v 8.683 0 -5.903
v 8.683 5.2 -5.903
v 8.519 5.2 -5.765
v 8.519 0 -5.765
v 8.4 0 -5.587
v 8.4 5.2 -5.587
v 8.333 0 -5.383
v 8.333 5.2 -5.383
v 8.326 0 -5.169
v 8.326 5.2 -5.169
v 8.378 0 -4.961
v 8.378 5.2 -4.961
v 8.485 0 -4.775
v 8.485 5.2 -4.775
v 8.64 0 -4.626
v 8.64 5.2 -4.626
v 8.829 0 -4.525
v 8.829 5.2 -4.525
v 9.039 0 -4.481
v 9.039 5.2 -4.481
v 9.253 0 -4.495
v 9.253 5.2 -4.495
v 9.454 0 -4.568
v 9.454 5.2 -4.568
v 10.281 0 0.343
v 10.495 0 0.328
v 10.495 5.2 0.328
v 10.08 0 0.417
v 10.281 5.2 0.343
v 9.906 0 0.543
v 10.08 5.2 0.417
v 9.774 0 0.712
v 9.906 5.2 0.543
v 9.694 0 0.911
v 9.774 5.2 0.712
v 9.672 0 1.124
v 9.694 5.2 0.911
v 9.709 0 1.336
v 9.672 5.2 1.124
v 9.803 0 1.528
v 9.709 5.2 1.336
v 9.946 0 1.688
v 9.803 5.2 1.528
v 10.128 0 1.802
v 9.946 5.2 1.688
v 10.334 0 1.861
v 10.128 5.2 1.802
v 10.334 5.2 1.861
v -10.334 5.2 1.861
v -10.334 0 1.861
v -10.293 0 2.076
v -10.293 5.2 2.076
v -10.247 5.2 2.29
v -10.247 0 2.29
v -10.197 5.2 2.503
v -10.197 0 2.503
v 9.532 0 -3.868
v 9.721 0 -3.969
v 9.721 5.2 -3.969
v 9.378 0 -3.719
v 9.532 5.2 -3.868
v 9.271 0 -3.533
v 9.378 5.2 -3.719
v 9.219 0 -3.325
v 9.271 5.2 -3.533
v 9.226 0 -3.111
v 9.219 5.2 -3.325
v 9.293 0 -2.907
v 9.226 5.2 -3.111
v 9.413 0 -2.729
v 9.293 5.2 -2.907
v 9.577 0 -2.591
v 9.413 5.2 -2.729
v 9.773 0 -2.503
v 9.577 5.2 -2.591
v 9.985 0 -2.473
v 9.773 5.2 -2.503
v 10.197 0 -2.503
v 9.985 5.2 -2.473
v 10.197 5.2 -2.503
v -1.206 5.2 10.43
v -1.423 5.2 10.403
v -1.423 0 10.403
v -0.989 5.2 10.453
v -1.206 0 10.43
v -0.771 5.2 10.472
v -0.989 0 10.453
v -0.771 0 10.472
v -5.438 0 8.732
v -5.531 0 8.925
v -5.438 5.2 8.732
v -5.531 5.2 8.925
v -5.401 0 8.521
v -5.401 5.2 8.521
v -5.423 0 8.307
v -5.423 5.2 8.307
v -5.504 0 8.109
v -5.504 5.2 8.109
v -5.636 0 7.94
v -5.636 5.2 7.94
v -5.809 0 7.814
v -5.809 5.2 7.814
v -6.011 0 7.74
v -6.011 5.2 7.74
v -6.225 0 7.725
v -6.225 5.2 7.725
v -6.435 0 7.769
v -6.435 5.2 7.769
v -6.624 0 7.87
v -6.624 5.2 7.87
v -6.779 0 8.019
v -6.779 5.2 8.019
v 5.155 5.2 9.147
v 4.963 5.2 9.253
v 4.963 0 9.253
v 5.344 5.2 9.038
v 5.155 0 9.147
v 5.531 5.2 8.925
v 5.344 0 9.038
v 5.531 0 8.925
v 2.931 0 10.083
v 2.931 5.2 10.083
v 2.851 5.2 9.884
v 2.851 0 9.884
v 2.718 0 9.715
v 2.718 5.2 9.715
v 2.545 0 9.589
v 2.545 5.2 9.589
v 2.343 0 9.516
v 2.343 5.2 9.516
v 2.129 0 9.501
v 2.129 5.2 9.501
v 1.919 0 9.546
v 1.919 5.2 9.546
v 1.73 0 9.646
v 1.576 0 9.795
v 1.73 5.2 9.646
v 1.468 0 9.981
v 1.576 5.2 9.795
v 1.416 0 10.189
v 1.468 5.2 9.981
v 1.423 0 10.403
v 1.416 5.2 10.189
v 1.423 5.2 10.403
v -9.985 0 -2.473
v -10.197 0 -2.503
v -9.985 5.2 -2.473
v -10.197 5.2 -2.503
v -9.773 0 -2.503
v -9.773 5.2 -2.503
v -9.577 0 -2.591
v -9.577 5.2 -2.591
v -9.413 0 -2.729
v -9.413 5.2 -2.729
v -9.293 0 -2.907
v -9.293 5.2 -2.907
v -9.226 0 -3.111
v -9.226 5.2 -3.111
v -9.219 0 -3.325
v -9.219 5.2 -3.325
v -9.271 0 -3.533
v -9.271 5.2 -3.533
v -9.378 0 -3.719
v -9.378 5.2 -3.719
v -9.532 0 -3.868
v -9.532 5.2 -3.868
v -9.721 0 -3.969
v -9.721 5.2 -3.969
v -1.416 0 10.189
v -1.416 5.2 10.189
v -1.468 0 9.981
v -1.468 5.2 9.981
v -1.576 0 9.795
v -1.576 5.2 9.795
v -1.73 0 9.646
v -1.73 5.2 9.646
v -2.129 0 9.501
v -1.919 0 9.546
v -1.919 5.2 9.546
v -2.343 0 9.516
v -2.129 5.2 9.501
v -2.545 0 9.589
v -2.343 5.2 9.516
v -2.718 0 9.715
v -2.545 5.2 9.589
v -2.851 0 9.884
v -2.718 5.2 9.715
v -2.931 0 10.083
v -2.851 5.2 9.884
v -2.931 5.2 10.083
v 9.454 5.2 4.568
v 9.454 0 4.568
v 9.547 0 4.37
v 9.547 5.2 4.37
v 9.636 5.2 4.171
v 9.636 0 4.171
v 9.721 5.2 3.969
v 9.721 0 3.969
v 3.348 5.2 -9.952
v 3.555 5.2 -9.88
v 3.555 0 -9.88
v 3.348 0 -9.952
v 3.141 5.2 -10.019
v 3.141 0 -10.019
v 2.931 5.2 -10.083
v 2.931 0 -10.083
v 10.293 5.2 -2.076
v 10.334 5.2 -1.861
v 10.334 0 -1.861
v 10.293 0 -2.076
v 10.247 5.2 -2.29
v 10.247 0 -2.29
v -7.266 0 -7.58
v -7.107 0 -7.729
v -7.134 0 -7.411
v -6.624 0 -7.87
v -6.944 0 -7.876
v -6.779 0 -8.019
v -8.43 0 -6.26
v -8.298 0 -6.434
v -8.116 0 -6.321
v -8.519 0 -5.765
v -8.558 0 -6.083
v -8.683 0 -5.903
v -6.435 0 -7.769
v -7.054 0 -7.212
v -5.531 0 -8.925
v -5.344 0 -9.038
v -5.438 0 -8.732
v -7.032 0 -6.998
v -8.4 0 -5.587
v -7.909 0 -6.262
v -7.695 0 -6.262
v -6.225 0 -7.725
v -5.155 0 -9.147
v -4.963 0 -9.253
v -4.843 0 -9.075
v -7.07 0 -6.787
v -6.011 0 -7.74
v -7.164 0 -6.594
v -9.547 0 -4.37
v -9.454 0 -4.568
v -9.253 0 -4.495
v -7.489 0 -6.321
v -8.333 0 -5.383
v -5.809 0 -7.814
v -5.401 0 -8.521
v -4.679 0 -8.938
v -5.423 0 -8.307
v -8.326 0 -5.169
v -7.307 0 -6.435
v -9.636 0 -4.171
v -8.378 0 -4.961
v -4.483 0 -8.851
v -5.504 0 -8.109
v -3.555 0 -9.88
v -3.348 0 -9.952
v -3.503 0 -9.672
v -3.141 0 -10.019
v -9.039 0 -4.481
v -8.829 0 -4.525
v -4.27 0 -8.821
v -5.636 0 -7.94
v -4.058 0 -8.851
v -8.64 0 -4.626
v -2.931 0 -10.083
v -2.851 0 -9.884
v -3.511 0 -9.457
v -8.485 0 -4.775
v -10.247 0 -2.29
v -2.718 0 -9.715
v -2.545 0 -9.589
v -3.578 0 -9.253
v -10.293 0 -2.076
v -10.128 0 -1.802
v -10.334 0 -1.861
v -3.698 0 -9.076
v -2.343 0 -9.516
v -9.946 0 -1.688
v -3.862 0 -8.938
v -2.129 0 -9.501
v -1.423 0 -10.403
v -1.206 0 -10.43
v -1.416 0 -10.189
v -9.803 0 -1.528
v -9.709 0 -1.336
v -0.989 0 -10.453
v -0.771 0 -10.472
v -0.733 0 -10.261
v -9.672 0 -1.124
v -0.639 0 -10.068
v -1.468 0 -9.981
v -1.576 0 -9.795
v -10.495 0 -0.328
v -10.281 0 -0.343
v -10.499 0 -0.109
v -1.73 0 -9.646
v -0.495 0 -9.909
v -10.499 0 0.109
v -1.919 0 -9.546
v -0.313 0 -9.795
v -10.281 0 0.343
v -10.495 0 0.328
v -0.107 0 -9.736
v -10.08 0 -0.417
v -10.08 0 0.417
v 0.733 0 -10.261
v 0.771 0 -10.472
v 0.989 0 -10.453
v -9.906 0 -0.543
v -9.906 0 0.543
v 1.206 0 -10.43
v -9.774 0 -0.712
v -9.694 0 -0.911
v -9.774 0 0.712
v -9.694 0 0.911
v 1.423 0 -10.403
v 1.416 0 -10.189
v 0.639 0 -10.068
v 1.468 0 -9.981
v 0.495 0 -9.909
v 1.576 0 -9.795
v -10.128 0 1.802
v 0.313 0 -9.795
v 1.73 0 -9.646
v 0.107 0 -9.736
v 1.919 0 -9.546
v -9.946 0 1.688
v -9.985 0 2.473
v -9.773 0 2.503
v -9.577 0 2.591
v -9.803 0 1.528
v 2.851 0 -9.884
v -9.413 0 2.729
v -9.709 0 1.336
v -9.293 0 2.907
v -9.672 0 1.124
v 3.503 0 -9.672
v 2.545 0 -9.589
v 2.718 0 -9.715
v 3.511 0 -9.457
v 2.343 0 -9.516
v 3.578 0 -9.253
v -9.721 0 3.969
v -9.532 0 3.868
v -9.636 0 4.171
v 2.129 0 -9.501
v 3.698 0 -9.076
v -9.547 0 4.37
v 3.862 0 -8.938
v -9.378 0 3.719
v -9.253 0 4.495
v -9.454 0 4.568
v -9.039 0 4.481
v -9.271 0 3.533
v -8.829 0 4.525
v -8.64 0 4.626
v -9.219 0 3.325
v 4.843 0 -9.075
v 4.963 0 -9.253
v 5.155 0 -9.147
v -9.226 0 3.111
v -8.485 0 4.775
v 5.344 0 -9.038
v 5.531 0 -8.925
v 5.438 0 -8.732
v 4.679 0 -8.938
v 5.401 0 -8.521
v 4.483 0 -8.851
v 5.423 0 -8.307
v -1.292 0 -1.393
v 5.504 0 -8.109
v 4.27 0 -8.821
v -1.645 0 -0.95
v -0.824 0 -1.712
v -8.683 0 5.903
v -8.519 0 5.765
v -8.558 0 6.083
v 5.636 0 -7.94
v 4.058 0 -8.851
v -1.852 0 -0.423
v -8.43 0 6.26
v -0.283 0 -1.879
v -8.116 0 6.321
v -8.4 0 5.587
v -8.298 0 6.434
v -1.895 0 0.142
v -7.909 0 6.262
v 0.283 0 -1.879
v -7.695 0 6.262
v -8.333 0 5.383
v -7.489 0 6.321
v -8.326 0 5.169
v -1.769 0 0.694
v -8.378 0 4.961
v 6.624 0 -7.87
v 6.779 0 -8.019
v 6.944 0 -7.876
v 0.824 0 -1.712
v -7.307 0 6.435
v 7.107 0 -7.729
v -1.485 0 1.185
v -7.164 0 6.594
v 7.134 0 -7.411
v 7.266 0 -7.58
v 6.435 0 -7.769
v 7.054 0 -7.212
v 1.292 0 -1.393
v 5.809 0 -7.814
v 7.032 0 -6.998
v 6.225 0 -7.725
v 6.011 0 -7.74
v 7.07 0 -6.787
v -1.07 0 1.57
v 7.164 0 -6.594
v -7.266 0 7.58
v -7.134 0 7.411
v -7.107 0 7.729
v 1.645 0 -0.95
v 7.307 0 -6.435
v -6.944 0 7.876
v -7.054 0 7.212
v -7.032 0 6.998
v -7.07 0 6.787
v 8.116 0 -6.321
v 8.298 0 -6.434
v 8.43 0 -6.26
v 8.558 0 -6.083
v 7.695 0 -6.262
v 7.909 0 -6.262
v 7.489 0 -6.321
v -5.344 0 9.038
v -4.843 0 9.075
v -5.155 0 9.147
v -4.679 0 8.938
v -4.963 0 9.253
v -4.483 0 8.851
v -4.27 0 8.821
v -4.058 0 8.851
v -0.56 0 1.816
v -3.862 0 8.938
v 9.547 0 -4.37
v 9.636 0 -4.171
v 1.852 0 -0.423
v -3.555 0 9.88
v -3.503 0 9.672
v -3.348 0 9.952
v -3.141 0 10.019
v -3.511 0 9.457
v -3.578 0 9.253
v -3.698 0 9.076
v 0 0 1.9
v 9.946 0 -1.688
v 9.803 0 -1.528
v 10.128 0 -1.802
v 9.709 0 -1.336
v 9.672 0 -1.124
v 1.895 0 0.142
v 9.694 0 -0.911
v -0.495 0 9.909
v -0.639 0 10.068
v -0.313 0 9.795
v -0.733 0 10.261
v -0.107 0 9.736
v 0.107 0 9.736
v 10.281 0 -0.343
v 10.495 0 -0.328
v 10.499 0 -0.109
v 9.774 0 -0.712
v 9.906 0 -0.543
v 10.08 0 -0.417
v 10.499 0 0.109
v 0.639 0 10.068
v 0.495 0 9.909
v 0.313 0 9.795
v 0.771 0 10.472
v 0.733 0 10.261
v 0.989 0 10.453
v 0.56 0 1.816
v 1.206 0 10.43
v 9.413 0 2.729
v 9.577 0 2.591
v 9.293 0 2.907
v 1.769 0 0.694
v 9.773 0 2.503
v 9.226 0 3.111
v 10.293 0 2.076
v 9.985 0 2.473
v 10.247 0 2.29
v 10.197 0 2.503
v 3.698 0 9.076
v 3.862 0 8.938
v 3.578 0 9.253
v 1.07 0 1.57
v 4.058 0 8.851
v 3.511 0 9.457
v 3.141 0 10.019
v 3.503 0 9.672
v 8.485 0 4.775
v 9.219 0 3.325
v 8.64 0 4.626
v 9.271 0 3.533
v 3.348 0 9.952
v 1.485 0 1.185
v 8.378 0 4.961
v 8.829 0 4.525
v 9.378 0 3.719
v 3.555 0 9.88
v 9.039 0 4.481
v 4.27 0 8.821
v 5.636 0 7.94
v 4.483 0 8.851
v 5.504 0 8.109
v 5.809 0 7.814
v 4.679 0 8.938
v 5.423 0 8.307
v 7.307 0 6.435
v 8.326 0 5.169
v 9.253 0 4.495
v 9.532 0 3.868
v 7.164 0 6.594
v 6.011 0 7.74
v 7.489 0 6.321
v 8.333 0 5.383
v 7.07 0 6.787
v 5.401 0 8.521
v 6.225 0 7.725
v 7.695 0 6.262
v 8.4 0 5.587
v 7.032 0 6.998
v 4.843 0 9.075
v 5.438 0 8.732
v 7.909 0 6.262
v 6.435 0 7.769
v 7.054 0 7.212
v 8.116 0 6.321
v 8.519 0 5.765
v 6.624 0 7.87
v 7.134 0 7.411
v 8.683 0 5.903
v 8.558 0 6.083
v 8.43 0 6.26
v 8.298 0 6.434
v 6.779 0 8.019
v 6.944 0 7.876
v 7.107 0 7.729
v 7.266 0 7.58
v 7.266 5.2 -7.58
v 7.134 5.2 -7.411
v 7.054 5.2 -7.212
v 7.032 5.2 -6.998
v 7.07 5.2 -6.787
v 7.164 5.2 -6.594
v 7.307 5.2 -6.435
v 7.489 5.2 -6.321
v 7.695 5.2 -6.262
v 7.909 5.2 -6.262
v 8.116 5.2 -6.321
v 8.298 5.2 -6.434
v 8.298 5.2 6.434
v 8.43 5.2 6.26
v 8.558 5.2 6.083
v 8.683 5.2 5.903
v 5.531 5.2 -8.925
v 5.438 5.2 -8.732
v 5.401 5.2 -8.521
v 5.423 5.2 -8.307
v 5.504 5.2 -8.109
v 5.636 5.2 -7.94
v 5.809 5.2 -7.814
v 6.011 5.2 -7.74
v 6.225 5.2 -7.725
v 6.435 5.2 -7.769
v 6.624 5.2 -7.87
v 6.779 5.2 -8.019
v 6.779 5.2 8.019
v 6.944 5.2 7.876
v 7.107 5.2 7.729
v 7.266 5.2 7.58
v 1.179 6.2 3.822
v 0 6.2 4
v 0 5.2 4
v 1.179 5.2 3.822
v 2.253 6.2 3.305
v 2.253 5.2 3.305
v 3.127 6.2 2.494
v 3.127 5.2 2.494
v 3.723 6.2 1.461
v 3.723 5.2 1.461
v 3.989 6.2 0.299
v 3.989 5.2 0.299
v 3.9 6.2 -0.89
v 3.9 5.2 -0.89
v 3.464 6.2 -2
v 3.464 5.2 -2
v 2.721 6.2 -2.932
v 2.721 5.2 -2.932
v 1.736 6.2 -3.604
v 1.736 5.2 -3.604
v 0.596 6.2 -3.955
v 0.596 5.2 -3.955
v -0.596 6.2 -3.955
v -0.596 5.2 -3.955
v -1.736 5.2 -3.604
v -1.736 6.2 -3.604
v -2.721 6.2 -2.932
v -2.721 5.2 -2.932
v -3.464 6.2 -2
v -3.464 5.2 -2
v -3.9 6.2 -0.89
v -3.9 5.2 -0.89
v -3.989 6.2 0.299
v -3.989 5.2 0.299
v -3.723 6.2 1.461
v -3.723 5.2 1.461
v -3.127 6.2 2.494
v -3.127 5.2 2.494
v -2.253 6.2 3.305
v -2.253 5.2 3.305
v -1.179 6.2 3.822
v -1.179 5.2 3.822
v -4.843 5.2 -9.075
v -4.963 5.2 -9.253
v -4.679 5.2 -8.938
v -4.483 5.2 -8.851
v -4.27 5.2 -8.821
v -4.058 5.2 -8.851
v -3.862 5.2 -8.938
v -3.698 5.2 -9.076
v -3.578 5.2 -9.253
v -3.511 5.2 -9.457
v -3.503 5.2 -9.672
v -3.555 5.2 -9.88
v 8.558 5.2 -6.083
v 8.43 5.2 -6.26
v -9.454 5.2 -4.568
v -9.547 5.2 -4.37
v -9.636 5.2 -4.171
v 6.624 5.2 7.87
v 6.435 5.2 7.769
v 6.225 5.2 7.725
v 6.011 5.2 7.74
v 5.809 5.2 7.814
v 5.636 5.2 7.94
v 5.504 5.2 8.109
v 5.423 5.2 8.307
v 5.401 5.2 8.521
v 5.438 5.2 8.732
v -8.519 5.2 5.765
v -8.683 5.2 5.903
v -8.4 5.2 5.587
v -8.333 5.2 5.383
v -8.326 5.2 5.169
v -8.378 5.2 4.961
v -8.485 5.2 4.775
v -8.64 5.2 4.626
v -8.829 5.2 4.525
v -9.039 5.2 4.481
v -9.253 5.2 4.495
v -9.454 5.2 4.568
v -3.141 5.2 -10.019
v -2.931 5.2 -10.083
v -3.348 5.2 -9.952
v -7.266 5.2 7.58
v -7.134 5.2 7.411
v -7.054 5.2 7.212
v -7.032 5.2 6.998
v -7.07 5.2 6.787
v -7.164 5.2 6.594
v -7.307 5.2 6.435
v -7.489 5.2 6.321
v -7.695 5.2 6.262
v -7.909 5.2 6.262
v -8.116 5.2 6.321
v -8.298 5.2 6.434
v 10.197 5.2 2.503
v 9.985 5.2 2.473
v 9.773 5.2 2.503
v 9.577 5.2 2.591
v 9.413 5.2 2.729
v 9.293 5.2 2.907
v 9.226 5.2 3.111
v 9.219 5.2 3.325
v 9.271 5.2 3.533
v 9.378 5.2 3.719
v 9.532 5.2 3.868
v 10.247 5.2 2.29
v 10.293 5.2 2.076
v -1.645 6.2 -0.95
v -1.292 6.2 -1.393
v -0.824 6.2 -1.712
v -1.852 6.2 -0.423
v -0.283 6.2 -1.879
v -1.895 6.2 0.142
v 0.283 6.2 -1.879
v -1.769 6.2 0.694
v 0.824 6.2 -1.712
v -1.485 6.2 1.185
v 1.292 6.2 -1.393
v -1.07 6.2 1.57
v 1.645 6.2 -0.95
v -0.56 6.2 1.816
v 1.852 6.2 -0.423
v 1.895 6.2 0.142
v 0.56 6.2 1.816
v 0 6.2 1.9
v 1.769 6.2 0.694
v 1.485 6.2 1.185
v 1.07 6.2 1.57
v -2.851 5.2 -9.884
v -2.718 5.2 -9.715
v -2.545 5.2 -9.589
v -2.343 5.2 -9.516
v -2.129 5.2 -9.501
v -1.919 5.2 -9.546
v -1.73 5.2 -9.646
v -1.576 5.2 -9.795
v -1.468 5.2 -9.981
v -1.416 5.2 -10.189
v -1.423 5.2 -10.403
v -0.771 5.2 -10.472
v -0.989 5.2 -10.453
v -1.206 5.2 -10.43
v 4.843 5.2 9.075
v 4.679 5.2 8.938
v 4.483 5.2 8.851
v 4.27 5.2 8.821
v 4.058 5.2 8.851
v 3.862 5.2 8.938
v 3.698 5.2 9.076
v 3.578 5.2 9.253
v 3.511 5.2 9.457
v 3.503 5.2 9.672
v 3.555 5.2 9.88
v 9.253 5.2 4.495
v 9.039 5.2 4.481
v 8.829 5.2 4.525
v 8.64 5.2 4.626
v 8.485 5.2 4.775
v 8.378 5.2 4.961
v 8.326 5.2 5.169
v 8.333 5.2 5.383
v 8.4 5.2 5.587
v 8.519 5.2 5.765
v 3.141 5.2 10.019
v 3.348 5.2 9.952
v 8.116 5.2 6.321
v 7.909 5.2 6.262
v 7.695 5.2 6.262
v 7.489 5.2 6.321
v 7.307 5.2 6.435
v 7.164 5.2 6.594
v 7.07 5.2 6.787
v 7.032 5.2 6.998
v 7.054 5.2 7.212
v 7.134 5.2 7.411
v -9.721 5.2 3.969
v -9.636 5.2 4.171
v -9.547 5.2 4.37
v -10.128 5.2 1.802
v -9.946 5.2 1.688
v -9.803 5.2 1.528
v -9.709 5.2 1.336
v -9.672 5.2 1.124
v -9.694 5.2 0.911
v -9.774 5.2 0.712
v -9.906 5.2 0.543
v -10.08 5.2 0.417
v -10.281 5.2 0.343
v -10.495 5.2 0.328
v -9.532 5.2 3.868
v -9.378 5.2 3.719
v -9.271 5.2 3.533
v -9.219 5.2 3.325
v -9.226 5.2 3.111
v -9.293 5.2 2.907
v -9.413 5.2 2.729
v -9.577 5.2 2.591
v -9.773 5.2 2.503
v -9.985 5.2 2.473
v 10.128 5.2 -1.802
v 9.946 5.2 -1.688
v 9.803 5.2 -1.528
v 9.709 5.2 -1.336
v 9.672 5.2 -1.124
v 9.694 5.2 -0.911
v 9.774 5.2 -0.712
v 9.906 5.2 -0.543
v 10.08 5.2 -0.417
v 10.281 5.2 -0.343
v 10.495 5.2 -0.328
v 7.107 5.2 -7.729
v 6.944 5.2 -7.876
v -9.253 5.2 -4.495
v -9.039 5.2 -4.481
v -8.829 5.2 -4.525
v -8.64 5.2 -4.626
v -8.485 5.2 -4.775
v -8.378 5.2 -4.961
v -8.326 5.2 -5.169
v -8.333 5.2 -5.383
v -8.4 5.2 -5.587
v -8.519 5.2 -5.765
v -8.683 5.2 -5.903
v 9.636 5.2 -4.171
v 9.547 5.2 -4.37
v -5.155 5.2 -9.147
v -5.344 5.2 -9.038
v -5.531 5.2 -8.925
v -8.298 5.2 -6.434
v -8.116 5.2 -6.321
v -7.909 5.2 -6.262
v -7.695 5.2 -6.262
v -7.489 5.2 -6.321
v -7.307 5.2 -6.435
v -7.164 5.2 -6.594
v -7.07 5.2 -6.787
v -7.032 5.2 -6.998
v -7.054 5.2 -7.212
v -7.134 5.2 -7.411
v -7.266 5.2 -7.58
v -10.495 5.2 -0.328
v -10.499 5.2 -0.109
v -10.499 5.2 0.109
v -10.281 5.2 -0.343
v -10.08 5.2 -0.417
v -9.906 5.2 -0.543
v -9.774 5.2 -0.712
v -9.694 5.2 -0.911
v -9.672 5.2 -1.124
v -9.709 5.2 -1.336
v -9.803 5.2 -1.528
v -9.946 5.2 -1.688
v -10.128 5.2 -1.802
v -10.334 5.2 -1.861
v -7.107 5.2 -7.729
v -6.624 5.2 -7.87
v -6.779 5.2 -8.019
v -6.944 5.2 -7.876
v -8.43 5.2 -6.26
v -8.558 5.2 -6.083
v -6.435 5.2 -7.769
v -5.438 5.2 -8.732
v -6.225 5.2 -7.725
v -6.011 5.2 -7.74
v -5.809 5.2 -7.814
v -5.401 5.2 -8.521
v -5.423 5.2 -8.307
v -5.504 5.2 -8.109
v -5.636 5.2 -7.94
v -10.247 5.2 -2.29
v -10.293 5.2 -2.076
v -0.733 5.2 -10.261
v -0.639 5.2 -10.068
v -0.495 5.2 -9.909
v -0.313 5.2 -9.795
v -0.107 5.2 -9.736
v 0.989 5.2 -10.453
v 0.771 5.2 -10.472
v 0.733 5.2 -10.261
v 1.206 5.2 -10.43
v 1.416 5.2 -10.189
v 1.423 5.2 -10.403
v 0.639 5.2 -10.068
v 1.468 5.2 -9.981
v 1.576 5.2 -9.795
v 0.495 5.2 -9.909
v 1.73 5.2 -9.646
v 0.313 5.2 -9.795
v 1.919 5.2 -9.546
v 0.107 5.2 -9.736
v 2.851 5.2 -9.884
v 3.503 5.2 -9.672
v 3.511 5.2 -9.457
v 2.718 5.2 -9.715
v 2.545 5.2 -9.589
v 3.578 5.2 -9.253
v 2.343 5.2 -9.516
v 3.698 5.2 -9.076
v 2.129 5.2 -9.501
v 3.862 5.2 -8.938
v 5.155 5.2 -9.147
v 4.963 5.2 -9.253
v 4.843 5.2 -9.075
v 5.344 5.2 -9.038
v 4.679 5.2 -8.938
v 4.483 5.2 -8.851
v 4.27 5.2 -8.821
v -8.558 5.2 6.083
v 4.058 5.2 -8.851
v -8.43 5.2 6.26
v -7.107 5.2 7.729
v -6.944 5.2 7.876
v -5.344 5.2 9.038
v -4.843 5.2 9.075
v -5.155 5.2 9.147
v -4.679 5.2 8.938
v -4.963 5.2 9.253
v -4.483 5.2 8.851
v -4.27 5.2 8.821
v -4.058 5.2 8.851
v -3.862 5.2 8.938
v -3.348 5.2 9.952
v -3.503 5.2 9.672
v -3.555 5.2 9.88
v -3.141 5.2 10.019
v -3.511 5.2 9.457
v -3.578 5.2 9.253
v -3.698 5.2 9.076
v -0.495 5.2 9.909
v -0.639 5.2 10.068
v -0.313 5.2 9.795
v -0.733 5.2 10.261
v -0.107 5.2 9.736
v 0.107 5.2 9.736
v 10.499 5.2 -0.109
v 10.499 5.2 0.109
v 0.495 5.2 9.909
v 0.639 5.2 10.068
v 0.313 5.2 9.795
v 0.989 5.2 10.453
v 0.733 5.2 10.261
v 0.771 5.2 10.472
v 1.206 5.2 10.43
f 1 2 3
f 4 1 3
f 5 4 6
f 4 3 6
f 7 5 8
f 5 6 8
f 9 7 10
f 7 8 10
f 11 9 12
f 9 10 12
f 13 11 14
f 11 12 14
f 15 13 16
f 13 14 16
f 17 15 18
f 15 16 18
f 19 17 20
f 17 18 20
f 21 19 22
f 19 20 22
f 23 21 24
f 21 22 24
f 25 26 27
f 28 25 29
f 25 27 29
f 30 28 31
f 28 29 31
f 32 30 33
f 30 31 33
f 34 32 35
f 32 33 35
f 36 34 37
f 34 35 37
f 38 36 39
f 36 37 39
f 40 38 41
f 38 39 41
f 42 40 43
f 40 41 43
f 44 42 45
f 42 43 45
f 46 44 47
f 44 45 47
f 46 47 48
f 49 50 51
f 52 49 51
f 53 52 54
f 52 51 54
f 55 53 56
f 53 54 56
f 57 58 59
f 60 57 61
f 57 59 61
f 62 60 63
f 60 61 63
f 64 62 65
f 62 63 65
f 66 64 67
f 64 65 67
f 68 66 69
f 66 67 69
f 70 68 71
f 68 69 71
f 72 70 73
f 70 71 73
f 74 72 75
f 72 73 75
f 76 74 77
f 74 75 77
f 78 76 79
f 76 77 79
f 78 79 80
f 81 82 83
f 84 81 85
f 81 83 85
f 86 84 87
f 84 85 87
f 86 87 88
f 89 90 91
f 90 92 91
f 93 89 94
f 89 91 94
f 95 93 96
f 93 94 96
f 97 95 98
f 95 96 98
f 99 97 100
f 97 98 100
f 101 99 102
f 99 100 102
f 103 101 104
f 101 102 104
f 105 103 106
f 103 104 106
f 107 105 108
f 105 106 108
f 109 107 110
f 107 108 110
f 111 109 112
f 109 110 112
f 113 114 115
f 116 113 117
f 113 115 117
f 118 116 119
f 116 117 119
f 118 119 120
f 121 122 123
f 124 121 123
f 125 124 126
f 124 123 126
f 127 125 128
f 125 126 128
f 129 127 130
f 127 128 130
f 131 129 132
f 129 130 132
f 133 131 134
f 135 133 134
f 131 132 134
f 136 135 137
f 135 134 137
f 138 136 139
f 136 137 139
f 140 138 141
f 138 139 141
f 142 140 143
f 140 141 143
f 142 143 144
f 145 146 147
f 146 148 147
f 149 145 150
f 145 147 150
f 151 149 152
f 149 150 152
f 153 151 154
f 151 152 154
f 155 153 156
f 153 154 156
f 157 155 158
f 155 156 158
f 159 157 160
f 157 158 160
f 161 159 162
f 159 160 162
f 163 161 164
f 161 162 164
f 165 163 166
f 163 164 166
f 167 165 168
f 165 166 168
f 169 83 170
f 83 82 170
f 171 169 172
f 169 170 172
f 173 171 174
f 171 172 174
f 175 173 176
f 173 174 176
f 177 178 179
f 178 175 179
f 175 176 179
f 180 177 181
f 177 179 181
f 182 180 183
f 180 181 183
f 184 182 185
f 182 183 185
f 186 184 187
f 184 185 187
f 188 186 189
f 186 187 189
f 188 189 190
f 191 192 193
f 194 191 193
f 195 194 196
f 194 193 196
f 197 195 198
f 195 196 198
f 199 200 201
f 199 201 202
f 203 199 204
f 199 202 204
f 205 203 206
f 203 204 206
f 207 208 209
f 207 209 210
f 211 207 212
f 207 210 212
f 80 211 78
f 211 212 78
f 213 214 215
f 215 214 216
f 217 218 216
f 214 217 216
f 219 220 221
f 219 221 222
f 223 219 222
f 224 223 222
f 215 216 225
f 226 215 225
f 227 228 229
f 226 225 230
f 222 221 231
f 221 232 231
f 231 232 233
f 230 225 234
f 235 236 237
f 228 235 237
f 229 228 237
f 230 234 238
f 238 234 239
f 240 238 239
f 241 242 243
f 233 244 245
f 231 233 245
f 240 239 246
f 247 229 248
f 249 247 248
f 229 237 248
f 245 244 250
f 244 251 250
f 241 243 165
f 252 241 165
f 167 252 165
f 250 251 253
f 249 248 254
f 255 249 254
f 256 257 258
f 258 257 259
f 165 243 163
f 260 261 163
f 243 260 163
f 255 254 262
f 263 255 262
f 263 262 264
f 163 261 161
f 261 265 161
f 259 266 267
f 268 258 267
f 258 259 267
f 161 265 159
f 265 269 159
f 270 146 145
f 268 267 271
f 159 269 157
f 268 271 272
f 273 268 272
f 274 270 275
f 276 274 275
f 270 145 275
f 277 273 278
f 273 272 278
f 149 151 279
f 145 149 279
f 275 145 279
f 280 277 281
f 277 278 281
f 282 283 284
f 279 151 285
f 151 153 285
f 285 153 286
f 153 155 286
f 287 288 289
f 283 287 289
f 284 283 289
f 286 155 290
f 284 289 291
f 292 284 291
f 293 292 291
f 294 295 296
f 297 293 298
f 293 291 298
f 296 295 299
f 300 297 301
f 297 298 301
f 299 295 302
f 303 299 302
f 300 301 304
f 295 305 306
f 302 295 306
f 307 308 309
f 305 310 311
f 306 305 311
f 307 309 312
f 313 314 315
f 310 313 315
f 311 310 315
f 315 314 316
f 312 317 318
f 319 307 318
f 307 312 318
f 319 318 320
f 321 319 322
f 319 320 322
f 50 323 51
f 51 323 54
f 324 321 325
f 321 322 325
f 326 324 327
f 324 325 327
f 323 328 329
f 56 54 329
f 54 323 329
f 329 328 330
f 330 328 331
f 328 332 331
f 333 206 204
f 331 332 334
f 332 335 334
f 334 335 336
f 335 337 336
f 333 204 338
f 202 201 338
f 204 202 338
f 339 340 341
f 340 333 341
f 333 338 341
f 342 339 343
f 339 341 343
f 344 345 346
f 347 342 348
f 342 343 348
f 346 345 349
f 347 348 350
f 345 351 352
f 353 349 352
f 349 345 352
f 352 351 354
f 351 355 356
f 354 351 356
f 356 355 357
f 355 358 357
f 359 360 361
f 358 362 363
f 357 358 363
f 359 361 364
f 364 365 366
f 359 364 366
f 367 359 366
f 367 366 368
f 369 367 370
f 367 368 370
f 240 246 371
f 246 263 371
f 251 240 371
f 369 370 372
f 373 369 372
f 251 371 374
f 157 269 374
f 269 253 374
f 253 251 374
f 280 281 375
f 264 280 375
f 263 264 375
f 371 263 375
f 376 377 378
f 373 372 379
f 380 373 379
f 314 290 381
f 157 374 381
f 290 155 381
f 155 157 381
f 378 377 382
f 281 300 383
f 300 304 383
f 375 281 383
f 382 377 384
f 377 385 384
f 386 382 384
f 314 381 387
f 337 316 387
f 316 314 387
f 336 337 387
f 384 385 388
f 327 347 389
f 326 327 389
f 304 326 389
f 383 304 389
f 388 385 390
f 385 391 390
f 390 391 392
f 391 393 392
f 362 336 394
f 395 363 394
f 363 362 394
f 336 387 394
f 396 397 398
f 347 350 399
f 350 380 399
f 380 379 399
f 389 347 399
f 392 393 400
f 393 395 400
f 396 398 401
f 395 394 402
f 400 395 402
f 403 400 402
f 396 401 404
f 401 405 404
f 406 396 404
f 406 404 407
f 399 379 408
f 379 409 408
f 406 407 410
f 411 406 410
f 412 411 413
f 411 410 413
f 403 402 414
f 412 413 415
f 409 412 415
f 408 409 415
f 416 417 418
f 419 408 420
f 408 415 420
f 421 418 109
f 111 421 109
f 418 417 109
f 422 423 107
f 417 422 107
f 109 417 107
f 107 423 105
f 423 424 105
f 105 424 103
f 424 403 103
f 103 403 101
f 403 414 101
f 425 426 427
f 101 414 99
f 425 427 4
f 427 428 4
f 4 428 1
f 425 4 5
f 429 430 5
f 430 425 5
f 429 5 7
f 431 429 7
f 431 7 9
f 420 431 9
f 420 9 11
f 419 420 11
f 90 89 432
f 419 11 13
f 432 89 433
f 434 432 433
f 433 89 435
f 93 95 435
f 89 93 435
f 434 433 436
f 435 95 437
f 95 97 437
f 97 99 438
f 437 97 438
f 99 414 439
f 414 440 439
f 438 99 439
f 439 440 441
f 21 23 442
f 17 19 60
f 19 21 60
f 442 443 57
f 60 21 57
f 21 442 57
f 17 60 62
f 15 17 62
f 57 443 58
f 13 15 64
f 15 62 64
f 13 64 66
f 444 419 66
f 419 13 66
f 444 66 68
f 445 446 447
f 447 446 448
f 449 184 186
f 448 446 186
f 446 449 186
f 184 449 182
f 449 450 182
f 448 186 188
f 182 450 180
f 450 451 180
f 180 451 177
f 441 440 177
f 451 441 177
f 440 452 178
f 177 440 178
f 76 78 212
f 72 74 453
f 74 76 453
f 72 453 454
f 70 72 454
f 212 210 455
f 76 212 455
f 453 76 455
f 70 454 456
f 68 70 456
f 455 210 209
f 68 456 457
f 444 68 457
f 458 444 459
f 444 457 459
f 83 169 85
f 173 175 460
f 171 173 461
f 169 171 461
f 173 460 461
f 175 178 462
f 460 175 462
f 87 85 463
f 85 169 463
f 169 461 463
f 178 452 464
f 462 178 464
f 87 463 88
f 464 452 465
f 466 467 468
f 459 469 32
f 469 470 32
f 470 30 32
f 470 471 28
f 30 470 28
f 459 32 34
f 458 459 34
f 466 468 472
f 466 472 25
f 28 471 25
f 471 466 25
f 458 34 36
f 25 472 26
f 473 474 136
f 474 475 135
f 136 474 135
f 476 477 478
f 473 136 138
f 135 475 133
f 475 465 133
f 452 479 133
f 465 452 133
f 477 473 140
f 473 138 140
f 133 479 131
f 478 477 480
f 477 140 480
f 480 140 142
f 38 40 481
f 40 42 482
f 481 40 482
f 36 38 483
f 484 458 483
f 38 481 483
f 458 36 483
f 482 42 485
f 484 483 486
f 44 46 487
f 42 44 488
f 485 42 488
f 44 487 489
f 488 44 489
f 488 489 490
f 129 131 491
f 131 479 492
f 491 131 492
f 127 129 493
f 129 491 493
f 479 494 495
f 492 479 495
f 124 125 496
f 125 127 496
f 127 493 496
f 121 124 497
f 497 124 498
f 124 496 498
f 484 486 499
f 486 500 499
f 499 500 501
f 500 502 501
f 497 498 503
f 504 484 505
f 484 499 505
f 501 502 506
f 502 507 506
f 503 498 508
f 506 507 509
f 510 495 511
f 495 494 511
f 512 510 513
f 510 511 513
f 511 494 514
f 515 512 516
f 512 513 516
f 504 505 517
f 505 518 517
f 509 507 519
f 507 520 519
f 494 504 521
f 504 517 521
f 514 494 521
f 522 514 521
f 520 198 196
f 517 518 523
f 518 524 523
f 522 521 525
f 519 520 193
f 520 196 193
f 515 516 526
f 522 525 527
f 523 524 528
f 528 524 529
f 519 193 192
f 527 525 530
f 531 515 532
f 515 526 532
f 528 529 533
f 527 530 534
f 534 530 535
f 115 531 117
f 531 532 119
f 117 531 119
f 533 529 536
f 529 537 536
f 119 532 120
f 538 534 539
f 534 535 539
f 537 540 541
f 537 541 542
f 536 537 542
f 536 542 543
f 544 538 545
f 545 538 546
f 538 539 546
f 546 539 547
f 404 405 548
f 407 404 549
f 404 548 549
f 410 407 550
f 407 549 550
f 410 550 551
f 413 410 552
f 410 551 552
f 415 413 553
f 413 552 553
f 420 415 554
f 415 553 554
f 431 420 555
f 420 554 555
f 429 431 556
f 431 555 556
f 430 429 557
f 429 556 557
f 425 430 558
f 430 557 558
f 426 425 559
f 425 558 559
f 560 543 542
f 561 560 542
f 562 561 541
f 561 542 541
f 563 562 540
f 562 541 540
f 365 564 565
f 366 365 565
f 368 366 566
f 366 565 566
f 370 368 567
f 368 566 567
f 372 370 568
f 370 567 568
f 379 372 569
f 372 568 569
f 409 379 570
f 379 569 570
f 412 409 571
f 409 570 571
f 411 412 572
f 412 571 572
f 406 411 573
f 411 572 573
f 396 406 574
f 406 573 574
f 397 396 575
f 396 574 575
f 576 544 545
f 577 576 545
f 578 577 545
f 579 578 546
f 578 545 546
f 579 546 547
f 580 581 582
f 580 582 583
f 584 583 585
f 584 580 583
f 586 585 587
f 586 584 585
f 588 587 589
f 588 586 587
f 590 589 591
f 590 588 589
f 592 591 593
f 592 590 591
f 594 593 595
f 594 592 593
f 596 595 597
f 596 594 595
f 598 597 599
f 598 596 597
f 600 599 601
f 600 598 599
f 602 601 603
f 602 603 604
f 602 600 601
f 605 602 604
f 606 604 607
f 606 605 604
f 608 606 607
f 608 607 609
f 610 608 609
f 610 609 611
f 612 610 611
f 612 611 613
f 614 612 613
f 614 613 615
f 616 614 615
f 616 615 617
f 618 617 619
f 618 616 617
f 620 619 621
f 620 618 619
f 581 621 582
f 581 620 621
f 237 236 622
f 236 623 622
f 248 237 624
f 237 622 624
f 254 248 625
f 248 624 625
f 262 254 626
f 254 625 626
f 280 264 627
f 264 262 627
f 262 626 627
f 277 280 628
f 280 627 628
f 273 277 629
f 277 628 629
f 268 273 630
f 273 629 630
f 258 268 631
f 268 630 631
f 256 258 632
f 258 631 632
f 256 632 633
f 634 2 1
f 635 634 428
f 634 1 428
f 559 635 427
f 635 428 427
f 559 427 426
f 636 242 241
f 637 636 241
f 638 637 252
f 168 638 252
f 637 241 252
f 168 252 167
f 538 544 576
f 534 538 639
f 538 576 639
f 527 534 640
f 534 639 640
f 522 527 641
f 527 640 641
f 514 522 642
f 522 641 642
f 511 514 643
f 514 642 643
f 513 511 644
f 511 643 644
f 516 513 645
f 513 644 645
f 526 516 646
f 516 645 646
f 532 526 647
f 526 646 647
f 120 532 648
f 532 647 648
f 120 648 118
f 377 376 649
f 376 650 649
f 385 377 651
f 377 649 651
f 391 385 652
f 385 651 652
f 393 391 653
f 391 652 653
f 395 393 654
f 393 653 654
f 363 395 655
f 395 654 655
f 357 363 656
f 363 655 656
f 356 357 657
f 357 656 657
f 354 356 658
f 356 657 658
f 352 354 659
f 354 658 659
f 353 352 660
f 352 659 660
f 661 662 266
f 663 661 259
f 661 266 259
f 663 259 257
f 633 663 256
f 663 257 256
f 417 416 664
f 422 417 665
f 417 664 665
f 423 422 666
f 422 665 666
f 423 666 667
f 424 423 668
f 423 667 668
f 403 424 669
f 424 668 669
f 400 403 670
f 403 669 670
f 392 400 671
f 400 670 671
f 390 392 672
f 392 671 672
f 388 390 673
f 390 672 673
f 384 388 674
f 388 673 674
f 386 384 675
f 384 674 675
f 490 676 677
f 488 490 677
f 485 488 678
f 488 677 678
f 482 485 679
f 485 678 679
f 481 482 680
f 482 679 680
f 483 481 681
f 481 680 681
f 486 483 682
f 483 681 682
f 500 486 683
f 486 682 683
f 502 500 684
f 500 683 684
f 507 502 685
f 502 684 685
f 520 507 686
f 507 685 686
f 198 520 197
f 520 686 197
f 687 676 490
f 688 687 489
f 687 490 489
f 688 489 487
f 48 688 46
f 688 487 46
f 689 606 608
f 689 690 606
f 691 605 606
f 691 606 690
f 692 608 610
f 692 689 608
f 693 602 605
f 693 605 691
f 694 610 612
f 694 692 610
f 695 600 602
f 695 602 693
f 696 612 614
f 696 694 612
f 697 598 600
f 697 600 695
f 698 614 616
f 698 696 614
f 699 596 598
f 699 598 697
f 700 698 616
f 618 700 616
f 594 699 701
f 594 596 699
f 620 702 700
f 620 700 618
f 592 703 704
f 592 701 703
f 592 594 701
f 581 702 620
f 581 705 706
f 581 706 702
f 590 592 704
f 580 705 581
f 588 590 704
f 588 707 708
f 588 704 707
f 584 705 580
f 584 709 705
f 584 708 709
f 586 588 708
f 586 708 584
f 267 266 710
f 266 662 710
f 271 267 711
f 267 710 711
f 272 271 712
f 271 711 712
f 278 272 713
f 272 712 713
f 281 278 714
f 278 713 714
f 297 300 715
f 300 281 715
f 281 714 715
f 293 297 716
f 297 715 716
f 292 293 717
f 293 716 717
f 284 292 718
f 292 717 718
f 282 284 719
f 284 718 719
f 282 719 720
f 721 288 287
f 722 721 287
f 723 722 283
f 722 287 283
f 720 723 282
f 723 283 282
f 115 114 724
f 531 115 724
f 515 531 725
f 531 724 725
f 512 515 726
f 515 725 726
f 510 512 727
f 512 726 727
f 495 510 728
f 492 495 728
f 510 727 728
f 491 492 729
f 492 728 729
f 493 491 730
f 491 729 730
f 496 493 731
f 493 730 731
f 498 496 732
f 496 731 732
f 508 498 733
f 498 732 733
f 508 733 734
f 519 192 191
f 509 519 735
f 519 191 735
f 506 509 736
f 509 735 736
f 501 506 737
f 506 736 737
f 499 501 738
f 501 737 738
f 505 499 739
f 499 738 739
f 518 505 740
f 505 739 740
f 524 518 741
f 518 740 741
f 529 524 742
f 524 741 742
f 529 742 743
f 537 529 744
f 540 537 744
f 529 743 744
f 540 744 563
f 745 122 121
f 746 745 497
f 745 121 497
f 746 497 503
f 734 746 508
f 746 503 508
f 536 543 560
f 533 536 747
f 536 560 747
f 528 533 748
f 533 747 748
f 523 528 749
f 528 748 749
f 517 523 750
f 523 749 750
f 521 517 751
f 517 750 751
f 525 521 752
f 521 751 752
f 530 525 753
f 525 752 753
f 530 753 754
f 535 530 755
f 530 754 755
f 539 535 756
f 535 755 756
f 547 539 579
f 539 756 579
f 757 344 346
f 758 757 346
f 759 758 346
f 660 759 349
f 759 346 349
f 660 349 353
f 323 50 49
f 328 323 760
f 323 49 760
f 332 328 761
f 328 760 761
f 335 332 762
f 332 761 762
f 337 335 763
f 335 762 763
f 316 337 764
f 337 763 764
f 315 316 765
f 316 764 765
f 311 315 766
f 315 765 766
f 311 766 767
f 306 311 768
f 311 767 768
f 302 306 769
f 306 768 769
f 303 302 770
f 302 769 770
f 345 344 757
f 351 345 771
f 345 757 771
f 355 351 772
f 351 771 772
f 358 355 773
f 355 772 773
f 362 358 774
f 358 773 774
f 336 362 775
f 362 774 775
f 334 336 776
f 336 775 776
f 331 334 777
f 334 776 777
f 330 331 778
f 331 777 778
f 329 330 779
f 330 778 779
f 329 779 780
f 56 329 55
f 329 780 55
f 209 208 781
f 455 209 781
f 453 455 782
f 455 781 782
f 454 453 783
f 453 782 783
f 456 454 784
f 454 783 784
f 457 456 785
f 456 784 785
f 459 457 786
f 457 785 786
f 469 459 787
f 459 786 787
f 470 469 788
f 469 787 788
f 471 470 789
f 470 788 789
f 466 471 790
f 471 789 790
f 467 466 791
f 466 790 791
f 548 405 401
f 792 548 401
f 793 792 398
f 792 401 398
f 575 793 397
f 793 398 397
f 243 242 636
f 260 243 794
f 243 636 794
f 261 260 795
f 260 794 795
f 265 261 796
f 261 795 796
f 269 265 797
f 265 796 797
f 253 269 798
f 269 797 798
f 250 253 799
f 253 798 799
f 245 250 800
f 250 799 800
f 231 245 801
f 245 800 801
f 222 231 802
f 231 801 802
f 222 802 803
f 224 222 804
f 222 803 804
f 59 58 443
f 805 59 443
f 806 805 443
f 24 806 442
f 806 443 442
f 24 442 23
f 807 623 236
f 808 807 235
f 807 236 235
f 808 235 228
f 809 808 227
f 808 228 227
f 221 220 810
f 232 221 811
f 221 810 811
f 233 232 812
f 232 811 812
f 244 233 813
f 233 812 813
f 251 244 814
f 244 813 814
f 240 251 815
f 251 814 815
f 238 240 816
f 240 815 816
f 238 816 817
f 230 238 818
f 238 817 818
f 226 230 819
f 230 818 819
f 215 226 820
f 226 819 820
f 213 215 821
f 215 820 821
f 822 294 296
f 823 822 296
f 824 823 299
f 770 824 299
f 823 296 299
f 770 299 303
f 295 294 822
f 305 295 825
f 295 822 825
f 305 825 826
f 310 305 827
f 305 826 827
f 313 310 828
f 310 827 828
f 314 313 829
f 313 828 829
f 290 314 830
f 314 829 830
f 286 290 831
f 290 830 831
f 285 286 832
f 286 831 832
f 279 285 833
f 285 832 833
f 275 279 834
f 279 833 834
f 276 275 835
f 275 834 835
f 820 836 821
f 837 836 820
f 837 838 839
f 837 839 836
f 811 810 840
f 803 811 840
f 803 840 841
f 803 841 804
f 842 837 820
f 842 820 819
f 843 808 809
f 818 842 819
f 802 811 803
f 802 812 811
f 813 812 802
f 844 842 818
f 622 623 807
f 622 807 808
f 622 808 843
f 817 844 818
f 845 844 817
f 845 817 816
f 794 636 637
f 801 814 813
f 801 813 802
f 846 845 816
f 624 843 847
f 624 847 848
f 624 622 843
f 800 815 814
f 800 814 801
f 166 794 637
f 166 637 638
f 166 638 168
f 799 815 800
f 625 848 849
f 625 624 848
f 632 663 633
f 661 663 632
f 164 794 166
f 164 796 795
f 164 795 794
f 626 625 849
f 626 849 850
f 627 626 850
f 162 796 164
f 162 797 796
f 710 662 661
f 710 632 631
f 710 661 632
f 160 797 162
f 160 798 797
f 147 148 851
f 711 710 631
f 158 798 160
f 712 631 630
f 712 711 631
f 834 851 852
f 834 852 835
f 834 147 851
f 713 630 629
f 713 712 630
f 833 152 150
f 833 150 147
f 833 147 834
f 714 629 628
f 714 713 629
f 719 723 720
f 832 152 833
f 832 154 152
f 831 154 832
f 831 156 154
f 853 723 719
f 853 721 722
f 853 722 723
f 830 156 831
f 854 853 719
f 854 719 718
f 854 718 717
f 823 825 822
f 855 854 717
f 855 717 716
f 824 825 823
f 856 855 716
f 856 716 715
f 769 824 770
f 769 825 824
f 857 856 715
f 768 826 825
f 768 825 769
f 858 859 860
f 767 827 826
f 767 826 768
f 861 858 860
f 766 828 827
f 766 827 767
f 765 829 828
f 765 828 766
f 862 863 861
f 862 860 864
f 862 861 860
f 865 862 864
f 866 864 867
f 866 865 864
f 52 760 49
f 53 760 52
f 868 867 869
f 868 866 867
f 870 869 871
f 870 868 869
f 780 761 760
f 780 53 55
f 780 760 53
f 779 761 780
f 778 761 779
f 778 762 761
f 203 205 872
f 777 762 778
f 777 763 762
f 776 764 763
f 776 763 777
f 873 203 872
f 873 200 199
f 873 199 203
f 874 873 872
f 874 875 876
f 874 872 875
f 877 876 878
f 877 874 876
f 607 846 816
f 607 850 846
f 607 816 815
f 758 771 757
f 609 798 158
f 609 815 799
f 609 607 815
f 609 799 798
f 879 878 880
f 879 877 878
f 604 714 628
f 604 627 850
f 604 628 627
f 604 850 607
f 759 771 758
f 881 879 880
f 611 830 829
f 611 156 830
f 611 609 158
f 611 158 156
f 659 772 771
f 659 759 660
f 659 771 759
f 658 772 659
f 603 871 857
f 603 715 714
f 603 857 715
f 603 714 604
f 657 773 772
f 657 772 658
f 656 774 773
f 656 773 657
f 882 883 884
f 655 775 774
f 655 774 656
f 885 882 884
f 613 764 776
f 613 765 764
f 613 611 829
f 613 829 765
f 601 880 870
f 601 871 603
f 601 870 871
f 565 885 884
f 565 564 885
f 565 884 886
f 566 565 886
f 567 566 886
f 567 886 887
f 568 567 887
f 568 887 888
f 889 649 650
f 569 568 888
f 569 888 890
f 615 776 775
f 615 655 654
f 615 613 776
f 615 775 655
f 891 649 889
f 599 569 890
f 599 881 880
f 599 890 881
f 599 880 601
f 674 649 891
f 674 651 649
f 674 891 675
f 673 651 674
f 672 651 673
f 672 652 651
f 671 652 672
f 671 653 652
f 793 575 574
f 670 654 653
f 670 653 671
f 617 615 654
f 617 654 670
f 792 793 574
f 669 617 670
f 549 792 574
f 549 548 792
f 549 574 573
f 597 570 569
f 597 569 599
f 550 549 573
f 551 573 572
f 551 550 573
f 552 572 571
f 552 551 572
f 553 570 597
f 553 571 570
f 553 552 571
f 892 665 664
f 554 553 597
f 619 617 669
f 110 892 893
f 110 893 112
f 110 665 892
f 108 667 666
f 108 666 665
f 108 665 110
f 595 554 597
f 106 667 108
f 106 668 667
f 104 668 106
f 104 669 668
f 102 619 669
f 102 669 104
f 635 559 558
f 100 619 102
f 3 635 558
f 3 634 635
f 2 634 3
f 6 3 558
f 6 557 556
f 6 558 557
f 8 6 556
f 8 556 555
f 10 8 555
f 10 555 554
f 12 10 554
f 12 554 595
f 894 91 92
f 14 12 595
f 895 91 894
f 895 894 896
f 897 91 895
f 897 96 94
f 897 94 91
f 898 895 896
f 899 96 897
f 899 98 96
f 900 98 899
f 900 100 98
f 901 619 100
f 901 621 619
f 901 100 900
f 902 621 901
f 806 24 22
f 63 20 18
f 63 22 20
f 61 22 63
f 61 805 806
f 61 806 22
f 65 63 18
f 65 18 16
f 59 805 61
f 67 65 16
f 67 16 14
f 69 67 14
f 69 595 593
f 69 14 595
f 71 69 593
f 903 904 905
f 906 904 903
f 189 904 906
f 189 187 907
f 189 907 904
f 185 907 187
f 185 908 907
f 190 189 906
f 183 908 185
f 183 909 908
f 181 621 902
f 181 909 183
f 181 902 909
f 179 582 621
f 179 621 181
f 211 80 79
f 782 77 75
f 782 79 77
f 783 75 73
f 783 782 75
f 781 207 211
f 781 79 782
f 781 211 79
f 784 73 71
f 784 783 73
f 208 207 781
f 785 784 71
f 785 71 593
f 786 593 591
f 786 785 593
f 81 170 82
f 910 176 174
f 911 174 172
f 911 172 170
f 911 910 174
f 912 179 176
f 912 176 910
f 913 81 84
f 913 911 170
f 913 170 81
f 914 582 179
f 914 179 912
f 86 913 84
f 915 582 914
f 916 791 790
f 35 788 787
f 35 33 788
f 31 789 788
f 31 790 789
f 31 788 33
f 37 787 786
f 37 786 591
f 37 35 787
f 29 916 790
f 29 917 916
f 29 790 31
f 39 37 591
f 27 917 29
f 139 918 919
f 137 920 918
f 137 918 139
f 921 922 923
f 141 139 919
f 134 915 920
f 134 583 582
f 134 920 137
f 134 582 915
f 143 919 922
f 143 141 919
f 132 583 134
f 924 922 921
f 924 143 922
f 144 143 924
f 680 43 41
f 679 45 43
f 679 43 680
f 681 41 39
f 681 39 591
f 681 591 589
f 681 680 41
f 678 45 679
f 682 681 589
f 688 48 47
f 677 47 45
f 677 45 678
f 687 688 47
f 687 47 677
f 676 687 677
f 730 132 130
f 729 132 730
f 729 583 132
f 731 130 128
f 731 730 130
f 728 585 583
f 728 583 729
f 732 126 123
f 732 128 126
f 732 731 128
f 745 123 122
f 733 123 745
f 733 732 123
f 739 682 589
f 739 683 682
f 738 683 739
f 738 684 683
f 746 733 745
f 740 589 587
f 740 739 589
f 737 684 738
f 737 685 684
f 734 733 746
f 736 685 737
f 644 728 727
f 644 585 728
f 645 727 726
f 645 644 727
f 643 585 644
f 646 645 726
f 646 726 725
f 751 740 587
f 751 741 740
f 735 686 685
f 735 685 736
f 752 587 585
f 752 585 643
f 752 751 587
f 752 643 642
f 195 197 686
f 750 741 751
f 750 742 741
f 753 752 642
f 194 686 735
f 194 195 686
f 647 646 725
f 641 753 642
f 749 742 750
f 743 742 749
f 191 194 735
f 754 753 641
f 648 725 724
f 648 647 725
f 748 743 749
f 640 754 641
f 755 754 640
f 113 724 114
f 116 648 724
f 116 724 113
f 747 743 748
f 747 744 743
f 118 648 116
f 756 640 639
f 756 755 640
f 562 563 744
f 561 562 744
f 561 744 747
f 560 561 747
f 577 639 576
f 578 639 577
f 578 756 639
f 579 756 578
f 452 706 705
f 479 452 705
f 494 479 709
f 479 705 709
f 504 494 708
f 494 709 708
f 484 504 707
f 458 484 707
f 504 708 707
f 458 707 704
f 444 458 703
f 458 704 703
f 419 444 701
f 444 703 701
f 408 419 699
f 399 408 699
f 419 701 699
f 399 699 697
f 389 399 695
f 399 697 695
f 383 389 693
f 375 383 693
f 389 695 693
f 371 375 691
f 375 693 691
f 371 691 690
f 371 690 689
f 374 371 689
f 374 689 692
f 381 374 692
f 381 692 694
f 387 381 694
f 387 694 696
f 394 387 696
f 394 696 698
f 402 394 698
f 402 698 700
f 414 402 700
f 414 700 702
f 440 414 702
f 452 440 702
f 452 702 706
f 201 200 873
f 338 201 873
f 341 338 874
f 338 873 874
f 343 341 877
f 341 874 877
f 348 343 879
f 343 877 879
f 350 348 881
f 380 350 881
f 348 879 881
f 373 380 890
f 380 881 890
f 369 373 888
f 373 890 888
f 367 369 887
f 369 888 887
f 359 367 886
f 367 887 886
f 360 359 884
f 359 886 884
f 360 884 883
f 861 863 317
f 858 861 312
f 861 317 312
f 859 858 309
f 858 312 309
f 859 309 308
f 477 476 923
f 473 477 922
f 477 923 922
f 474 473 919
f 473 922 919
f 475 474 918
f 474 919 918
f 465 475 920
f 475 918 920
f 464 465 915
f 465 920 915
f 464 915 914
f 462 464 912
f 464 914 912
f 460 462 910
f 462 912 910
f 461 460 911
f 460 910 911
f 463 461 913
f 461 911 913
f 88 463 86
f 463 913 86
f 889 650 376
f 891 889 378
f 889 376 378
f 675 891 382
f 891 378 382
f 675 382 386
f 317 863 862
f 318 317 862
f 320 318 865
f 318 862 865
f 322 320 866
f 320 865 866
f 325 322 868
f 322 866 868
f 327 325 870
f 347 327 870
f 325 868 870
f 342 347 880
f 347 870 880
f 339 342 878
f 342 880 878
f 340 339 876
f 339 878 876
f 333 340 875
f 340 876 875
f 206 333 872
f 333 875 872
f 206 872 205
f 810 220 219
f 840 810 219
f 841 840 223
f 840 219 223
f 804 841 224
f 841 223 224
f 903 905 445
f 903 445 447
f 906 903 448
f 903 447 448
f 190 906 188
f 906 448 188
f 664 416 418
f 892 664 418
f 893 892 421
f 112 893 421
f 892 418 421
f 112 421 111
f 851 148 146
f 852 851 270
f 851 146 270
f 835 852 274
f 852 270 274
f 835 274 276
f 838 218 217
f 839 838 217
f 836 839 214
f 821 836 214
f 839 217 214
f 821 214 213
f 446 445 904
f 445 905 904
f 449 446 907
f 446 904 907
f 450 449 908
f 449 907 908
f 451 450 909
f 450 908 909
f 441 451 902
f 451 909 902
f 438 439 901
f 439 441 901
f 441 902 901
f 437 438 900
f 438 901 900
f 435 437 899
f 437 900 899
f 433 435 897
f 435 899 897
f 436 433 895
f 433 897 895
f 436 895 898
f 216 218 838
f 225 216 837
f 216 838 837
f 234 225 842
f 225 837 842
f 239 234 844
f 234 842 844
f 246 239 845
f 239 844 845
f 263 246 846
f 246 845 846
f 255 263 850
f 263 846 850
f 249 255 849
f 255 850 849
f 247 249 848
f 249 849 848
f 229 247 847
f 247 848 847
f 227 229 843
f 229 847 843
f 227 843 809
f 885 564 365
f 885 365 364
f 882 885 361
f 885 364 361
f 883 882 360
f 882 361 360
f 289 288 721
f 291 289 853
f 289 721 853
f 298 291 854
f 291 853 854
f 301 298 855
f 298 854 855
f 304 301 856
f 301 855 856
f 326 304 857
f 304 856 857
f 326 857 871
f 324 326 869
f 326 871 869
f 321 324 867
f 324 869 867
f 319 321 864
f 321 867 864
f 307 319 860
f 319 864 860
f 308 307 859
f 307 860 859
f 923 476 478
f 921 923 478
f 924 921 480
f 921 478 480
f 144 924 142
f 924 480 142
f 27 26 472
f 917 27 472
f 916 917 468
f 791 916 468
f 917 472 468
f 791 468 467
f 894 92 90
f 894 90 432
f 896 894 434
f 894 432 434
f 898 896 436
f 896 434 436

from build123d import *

# Parameters (mm, degrees)
SKETCH_1_R          = 10.5
EXTRUDE_1_DEPTH     = 5.2
SKETCH_2_R          = 1.9
CUT_EXTRUDE_1_DEPTH = 16.733403955
EXTRUDE_START       = 1
SKETCH_3_R          = 4
SKETCH_3_R_2        = 1.9
EXTRUDE_2_DEPTH     = 1
SKETCH_4_R          = 0.771394001
CUT_EXTRUDE_3_DEPTH = 16.733403955


with BuildPart() as part:
    # Эскиз1 → Бобышка-Вытянуть1 (new body)
    with BuildSketch(Plane(origin=(0, 0, 0), x_dir=(1, 0, 0), z_dir=(0, 1, 0))):
        with Locations(Location((0, 0, 0), (0, 0, 270))):
            Circle(SKETCH_1_R)
    extrude(amount=EXTRUDE_1_DEPTH)

    # Эскиз2 → Вырез-Вытянуть1 (cut, through all)
    with BuildSketch(Plane(origin=(0, 5.2, 0), x_dir=(1, 0, 0), z_dir=(0, 1, 0))):
        with Locations(Location((0, 0, 0), (0, 0, 270))):
            Circle(SKETCH_2_R)
    extrude(amount=-CUT_EXTRUDE_1_DEPTH, mode=Mode.SUBTRACT)

    # Эскиз3 → Бобышка-Вытянуть2 (add)
    with BuildSketch(Plane(origin=(0, 5.2, 0), x_dir=(1, 0, 0), z_dir=(0, 1, 0)).offset(EXTRUDE_START)):
        with Locations(Location((0, 0, 0), (0, 0, 270))):
            Circle(SKETCH_3_R)
        with Locations(Location((0, 0, 0), (0, 0, 270))):
            Circle(SKETCH_3_R_2, mode=Mode.SUBTRACT)
    extrude(amount=-EXTRUDE_2_DEPTH)

    # Эскиз4 → Вырез-Вытянуть3 (cut, through all)
    with BuildSketch(Plane(origin=(0, 5.2, 0), x_dir=(1, 0, 0), z_dir=(0, 1, 0))):
        with Locations((0, 10.5)):
            Circle(SKETCH_4_R)
        with Locations((2.183072754, 10.270549808)):
            Circle(SKETCH_4_R)
        with Locations((4.270734752, 9.592227305)):
            Circle(SKETCH_4_R)
        with Locations((6.171745149, 8.494678441)):
            Circle(SKETCH_4_R)
        with Locations((7.803020668, 7.025871367)):
            Circle(SKETCH_4_R)
        with Locations((9.09326674, 5.25)):
            Circle(SKETCH_4_R)
        with Locations((9.986093421, 3.244678441)):
            Circle(SKETCH_4_R)
        with Locations((10.442479901, 1.097548864)):
            Circle(SKETCH_4_R)
        with Locations((10.442479901, -1.097548864)):
            Circle(SKETCH_4_R)
        with Locations((9.986093421, -3.244678441)):
            Circle(SKETCH_4_R)
        with Locations((9.09326674, -5.25)):
            Circle(SKETCH_4_R)
        with Locations((7.803020668, -7.025871367)):
            Circle(SKETCH_4_R)
        with Locations((6.171745149, -8.494678441)):
            Circle(SKETCH_4_R)
        with Locations((4.270734752, -9.592227305)):
            Circle(SKETCH_4_R)
        with Locations((2.183072754, -10.270549808)):
            Circle(SKETCH_4_R)
        with Locations((0, -10.5)):
            Circle(SKETCH_4_R)
        with Locations((-2.183072754, -10.270549808)):
            Circle(SKETCH_4_R)
        with Locations((-4.270734752, -9.592227305)):
            Circle(SKETCH_4_R)
        with Locations((-6.171745149, -8.494678441)):
            Circle(SKETCH_4_R)
        with Locations((-7.803020668, -7.025871367)):
            Circle(SKETCH_4_R)
        with Locations((-9.09326674, -5.25)):
            Circle(SKETCH_4_R)
        with Locations((-9.986093421, -3.244678441)):
            Circle(SKETCH_4_R)
        with Locations((-10.442479901, -1.097548864)):
            Circle(SKETCH_4_R)
        with Locations((-10.442479901, 1.097548864)):
            Circle(SKETCH_4_R)
        with Locations((-9.986093421, 3.244678441)):
            Circle(SKETCH_4_R)
        with Locations((-9.09326674, 5.25)):
            Circle(SKETCH_4_R)
        with Locations((-7.803020668, 7.025871367)):
            Circle(SKETCH_4_R)
        with Locations((-6.171745149, 8.494678441)):
            Circle(SKETCH_4_R)
        with Locations((-4.270734752, 9.592227305)):
            Circle(SKETCH_4_R)
        with Locations((-2.183072754, 10.270549808)):
            Circle(SKETCH_4_R)
    extrude(amount=-CUT_EXTRUDE_3_DEPTH, mode=Mode.SUBTRACT)


solid = part.part
